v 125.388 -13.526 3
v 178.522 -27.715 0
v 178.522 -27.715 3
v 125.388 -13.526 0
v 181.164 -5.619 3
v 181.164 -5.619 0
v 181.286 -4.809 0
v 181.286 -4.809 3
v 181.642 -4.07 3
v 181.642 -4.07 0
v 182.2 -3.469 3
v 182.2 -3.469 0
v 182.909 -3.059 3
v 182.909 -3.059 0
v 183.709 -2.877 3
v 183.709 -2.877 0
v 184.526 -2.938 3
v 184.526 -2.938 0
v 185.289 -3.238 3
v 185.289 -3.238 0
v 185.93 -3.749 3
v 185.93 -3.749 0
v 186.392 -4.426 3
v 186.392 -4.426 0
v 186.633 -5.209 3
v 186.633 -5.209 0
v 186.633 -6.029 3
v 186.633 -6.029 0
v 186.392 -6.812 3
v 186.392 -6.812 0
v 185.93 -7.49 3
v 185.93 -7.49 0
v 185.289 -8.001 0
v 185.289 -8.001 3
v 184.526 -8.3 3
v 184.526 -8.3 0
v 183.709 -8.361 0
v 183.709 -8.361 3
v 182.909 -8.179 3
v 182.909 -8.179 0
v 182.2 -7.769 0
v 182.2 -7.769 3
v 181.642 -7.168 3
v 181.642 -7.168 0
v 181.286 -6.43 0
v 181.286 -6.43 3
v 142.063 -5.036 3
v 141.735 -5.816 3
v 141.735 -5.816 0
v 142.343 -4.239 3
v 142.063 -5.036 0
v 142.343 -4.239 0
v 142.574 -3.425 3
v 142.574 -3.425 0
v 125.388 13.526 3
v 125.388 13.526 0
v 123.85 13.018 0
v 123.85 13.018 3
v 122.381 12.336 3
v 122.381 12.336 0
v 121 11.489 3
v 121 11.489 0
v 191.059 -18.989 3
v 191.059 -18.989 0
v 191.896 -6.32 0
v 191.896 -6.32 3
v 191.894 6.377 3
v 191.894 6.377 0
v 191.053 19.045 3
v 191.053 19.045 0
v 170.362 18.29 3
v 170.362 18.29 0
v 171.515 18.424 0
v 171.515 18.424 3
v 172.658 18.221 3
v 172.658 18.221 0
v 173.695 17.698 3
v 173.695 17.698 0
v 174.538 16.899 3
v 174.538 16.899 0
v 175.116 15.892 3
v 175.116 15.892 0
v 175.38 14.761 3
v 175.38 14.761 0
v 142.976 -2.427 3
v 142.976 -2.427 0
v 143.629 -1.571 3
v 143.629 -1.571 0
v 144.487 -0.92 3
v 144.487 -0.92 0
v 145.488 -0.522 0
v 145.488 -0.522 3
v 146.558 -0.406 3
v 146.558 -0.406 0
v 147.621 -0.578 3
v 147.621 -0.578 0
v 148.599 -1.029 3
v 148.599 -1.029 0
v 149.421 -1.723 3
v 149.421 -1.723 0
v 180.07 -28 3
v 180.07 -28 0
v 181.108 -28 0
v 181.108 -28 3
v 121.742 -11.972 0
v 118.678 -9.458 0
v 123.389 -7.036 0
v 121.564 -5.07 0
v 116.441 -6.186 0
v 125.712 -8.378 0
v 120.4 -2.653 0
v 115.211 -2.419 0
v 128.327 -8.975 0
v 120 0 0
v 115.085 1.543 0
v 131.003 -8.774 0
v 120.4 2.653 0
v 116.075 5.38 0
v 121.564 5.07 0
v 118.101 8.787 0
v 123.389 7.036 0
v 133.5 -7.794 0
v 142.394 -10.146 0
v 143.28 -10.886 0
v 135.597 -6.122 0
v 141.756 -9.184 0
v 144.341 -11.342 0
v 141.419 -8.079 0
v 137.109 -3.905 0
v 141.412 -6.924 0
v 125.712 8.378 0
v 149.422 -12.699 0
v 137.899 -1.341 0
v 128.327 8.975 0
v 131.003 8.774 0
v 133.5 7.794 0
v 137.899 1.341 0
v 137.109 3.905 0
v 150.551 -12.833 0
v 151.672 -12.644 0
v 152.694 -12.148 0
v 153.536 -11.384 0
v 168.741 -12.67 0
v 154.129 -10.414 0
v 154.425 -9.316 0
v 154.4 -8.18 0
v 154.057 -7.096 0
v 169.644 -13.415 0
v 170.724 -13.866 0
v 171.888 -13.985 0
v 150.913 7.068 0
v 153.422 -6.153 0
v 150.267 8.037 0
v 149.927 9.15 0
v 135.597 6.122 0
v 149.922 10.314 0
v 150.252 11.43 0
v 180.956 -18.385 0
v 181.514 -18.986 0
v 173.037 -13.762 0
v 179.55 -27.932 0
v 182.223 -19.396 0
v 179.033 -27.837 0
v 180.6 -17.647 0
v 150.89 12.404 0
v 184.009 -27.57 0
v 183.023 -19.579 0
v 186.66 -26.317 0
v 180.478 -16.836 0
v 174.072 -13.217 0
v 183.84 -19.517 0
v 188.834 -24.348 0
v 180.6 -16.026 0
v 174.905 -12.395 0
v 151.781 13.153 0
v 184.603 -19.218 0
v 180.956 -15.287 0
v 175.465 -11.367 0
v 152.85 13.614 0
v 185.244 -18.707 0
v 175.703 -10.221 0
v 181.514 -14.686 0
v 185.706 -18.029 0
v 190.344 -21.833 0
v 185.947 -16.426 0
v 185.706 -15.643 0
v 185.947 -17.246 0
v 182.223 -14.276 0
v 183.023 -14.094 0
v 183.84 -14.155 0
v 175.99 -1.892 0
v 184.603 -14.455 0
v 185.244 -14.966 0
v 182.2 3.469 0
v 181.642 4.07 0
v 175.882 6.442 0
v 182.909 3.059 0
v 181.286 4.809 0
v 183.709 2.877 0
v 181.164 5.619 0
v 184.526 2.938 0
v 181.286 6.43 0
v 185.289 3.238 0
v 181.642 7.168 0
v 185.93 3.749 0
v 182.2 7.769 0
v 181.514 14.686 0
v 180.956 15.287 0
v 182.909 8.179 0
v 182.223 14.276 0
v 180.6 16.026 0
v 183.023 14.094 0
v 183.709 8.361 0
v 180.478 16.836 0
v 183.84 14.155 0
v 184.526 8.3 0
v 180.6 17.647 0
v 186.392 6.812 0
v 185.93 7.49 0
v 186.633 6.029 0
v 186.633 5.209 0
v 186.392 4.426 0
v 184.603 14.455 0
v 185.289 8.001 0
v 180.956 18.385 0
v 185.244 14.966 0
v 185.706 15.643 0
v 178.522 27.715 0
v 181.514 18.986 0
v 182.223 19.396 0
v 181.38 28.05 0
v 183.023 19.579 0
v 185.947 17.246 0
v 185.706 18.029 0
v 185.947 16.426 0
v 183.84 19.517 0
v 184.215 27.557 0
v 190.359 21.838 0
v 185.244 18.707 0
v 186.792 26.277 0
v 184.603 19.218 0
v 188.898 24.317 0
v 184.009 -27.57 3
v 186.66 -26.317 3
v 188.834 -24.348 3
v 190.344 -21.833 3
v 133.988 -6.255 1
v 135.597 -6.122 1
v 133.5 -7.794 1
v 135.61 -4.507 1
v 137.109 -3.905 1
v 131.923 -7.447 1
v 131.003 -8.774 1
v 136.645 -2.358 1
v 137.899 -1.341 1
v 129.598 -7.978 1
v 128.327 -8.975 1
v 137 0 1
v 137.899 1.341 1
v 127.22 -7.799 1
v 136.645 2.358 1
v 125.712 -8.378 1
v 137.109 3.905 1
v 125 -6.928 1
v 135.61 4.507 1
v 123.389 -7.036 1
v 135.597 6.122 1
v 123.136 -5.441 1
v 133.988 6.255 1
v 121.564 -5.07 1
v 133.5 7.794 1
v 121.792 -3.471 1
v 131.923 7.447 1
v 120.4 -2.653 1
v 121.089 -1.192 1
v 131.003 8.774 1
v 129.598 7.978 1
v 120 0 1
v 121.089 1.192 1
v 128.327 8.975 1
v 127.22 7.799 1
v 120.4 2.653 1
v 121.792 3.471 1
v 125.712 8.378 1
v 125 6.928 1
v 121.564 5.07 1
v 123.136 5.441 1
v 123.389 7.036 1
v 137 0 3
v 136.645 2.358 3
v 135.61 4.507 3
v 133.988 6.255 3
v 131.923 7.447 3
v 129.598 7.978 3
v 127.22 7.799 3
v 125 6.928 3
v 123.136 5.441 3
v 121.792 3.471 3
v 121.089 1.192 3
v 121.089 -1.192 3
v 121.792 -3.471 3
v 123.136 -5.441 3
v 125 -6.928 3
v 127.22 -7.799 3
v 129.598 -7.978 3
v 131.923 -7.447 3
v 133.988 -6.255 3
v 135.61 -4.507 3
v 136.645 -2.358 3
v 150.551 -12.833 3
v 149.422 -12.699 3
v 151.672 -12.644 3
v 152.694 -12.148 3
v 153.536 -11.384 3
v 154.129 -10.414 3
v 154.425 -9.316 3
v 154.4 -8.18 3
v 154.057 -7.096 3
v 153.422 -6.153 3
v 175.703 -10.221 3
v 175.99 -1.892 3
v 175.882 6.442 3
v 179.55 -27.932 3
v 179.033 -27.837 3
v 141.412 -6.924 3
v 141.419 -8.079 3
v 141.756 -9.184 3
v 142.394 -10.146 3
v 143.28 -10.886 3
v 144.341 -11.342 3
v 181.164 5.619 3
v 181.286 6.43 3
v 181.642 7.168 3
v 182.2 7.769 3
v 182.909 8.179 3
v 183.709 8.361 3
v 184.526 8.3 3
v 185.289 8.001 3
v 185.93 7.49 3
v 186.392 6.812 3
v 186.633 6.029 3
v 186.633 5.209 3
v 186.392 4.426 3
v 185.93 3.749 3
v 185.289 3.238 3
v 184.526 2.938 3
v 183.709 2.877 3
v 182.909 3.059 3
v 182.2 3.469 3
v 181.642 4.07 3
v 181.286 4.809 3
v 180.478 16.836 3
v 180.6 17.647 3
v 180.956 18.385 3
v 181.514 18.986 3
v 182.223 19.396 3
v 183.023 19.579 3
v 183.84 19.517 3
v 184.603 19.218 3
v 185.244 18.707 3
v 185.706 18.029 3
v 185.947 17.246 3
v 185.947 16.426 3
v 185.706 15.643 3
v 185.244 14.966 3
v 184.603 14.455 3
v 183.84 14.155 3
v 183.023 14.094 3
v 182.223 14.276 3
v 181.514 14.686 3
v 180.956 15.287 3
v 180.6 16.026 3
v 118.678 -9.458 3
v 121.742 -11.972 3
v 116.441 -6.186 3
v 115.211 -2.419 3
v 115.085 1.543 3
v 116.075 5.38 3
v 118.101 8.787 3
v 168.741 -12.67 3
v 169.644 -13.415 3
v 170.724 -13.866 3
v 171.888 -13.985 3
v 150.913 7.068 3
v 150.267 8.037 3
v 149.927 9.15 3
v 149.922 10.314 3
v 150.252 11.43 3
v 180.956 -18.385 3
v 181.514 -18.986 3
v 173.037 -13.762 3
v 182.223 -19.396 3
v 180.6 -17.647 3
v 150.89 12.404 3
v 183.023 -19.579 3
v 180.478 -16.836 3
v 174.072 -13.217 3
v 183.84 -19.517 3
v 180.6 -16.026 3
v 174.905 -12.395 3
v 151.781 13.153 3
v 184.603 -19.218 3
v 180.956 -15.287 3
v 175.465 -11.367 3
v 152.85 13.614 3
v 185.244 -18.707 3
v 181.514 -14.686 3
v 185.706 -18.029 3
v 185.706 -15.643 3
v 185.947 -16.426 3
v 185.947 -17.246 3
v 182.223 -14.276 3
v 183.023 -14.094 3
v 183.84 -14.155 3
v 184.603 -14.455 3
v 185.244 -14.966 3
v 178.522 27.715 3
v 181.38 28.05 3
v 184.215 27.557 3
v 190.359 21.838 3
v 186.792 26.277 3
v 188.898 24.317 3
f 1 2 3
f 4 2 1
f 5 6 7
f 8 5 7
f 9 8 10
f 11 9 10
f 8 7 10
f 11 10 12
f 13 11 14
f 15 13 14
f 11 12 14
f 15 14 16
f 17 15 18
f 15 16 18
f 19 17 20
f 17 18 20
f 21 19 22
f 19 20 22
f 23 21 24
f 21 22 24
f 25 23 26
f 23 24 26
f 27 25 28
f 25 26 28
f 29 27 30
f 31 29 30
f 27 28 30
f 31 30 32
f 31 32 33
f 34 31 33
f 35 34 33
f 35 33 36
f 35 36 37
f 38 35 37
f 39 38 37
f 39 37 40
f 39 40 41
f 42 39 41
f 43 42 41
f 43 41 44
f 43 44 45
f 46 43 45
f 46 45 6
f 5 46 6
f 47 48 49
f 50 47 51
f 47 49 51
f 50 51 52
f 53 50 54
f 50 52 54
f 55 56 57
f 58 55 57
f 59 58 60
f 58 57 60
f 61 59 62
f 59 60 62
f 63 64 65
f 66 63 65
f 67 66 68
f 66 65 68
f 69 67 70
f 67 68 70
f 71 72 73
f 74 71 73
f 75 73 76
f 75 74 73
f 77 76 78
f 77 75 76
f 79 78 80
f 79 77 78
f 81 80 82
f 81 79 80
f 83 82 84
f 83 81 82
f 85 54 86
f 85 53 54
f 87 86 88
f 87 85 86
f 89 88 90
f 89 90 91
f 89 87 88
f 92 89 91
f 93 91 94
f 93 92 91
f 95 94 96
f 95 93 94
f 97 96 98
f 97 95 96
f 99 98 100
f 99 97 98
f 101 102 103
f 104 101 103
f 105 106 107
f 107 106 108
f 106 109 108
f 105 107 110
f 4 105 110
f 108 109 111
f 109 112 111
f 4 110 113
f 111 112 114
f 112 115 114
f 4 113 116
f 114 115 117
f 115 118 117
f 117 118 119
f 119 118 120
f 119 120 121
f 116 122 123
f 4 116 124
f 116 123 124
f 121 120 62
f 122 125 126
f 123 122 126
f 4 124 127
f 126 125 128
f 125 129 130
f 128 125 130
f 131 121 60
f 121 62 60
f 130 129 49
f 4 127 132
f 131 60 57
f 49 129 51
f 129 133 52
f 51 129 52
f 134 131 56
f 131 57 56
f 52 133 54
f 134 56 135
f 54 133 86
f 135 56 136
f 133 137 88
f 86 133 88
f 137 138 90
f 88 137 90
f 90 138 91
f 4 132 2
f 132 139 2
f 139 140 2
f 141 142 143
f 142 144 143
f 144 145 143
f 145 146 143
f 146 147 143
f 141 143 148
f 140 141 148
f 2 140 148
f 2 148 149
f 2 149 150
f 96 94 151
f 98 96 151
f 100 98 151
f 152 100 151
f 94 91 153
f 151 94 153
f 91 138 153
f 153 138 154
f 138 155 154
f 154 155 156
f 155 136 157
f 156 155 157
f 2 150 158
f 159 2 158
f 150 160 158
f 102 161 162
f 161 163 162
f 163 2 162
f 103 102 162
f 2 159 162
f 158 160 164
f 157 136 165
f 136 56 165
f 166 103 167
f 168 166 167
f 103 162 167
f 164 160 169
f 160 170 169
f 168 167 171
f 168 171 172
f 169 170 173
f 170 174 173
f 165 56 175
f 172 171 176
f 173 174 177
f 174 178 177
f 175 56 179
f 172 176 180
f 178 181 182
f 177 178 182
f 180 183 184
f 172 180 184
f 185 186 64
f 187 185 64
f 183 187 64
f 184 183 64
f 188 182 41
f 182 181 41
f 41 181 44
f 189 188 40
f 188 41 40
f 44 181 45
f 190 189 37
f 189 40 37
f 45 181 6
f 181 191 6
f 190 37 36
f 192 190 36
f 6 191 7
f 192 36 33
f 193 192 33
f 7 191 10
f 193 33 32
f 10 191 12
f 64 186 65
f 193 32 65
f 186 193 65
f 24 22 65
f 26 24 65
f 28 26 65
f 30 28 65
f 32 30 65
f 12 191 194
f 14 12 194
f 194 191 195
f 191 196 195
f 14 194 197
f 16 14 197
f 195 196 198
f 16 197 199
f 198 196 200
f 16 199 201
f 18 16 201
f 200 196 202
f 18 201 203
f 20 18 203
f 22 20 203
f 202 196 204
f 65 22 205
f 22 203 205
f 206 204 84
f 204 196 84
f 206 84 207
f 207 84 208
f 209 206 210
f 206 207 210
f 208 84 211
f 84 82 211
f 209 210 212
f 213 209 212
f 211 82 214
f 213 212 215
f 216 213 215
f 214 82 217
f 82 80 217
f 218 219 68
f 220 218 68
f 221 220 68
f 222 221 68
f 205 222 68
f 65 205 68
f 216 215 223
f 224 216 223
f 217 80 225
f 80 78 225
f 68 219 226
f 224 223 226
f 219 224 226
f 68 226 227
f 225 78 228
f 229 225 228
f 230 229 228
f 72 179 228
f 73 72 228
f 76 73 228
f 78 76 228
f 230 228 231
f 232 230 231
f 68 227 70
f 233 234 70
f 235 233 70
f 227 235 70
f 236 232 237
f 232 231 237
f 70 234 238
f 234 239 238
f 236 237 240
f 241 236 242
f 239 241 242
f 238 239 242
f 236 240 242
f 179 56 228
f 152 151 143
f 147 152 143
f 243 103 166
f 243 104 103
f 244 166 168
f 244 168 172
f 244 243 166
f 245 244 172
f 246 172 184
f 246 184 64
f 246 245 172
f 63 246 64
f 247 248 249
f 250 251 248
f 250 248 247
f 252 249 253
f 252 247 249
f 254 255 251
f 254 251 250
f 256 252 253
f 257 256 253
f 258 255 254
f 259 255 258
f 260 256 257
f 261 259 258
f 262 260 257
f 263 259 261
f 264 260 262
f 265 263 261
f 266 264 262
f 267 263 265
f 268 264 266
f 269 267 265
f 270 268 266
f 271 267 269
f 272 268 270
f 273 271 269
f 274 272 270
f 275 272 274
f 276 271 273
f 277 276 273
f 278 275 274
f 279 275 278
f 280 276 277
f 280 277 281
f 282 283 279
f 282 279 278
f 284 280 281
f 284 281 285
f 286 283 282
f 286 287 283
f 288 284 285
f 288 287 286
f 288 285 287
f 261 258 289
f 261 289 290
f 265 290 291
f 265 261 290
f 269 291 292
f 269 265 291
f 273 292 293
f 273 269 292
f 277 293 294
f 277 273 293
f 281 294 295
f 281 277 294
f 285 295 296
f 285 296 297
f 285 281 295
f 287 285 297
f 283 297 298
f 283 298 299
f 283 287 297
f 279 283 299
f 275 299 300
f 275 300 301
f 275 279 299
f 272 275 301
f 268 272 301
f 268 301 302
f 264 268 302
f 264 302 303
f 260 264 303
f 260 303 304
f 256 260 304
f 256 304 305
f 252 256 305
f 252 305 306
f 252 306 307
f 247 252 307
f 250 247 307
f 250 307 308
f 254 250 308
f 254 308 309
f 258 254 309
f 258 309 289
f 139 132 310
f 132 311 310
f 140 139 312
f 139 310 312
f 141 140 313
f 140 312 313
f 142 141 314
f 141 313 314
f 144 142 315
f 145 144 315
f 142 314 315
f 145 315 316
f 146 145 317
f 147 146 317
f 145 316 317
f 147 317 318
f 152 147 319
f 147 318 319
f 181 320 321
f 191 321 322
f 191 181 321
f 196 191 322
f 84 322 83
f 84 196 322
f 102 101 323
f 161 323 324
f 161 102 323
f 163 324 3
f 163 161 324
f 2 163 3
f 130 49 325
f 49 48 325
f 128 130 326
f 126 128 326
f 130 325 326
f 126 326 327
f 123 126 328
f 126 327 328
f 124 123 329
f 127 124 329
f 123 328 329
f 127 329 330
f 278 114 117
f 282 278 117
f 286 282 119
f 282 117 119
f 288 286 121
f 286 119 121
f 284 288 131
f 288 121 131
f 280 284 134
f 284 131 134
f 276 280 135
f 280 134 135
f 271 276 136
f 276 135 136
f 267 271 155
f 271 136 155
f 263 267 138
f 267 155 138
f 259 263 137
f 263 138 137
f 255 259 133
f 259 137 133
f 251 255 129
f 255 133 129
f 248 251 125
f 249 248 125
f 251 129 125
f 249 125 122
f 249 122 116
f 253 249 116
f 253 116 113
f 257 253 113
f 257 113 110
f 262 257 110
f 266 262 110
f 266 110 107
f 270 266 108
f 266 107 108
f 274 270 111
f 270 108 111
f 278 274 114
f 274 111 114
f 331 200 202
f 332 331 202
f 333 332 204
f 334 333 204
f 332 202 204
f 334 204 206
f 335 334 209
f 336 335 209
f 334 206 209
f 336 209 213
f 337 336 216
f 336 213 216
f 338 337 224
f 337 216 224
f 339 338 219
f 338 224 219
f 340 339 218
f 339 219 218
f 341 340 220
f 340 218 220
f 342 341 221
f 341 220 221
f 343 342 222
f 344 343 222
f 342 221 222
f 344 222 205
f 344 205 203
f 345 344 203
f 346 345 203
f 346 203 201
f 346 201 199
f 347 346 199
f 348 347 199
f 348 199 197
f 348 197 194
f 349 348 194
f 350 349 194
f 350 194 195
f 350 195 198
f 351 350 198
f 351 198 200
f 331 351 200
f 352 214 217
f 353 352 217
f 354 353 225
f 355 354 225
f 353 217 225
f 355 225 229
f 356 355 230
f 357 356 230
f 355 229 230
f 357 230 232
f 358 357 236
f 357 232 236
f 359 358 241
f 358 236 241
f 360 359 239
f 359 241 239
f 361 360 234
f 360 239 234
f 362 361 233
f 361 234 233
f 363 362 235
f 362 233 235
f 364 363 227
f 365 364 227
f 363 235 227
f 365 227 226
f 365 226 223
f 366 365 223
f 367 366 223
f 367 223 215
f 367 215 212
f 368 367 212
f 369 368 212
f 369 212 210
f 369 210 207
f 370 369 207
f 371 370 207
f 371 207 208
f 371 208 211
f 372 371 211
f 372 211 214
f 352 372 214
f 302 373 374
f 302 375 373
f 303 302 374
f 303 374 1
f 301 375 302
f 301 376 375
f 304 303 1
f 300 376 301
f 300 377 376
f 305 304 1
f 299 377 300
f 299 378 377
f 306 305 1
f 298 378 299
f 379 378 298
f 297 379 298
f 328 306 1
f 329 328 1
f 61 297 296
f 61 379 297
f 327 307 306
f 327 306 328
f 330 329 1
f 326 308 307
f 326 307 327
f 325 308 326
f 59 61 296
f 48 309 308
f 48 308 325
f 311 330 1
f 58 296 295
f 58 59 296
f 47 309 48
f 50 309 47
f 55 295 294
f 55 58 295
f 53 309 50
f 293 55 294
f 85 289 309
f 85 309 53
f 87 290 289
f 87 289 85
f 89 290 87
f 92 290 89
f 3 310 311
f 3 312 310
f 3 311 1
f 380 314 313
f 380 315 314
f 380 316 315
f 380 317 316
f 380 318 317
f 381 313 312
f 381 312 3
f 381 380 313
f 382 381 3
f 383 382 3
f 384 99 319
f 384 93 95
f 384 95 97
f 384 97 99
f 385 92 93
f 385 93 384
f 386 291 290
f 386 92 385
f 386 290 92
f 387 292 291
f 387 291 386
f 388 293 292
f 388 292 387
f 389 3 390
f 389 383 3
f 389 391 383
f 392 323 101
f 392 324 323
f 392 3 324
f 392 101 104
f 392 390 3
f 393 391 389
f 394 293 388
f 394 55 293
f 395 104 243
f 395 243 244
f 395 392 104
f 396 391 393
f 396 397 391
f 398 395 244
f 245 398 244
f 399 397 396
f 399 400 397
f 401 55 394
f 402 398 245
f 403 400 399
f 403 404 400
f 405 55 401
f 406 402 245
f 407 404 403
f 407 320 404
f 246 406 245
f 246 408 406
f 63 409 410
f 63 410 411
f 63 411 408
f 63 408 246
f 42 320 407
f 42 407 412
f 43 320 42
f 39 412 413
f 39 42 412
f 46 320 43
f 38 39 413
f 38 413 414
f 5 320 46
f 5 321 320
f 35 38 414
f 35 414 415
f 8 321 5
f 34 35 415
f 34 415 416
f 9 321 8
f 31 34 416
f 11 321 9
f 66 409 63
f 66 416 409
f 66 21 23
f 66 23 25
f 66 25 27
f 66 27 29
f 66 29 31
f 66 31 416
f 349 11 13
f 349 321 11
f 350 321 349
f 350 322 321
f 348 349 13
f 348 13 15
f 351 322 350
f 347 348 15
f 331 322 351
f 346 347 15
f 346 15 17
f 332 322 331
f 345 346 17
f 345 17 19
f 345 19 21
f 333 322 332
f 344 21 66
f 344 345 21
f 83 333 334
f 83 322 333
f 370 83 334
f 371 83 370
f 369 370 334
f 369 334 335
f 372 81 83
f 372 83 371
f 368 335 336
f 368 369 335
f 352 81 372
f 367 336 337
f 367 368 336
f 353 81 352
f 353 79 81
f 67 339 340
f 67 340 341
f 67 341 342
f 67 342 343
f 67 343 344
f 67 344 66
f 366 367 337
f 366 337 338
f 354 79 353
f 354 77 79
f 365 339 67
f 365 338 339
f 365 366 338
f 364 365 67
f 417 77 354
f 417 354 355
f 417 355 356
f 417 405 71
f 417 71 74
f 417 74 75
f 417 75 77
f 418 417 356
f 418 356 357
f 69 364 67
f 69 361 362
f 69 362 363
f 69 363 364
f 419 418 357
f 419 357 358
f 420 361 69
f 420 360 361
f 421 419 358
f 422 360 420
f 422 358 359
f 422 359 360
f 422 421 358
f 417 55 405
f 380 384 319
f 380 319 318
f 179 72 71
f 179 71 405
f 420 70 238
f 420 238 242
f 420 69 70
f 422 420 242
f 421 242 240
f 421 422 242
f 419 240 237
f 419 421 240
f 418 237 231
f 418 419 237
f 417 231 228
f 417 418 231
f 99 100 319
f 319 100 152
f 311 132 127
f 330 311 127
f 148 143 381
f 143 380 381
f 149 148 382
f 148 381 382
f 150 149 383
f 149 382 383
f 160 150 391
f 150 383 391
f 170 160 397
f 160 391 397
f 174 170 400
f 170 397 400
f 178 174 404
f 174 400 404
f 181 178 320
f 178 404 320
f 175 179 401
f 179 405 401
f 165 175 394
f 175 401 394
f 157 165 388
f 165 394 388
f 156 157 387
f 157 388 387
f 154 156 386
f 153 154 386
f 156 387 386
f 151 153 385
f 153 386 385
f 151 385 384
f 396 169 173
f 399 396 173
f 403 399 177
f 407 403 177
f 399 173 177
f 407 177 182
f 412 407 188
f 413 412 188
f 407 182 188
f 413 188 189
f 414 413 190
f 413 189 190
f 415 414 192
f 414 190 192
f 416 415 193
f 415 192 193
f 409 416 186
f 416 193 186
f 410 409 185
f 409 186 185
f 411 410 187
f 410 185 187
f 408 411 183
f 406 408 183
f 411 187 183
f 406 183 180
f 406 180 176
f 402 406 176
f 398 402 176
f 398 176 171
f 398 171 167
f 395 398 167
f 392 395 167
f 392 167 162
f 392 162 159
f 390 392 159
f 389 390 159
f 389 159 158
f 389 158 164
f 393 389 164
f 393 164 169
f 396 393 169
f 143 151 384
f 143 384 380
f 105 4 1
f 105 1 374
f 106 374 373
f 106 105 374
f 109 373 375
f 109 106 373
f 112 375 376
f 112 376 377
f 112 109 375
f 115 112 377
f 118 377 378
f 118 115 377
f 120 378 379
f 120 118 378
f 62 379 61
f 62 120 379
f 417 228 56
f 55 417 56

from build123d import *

# Parameters (mm, degrees)
SKETCH_1_R          = 8
EXTRUDE_1_DEPTH     = 3
HOLE_WIZARD_M31_D   = 3.4
HOLE_WIZARD_M51_D   = 5.5
HOLE_WIZARD_M52_D   = 5.5
FILLET_1_R          = 10
FILLET_2_R          = 5
SKETCH_9_R          = 9
CUT_EXTRUDE_2_DEPTH = 1
CUT_EXTRUDE_3_DEPTH = 195.061830596
CUT_EXTRUDE_4_DEPTH = 195.061830596
CUT_EXTRUDE_6_DEPTH = 195.061830596
FILLET_6_R          = 4


with BuildPart() as part:
    # Эскиз1 → Бобышка-Вытянуть1 (new body)
    with BuildSketch(Plane.XY):
        with BuildLine():
            Line((-9.508526364, -3.096437692), (-1.398717752, -28))
            Line((-1.398717752, -28), (189.947361129, -28))
            ThreePointArc((189.947361129, -28), (191.995297124, 1.34383112), (189.536809823, 30.656120467))
            Line((189.536809823, 30.656120467), (125.388049295, 13.526041997))
            ThreePointArc((125.388049295, 13.526041997), (123.105499175, 12.698616461), (121.000225207, 11.489282104))
            Line((121.000225207, 11.489282104), (83.76563687, -14.436473614))
            Line((83.76563687, -14.436473614), (63.718090084, -22))
            Line((63.718090084, -22), (35.731449132, -22))
            Line((35.731449132, -22), (20.675178874, -13.02912429))
            Line((20.675178874, -13.02912429), (8.326583423, 5.537870395))
            ThreePointArc((8.326583423, 5.537870395), (-4.357415095, 9.00071851), (-9.508526364, -3.096437692))
        make_face()
        with Locations((129, 0)):
            Circle(SKETCH_1_R, mode=Mode.SUBTRACT)
    extrude(amount=EXTRUDE_1_DEPTH)

    # Отверстие с зазором M31 (through all)
    with Locations(Plane.XY.offset(3)):
        with Locations((9, -25), (40.5, -25), (72, -25)):
            Hole(HOLE_WIZARD_M31_D / 2)

    # Отверстие с зазором M51 (through all)
    with Locations(Plane.XY.offset(3)):
        with Locations((0, 0)):
            Hole(HOLE_WIZARD_M51_D / 2)

    # Отверстие с зазором M52 (through all)
    with Locations(Plane.XY.offset(3)):
        with Locations((183.228106674, 16.836297834), (183.914180714, 5.619086431), (183.914180714, -5.619086431), (183.228106674, -16.836297834)):
            Hole(HOLE_WIZARD_M52_D / 2)

    # Скругление1
    fillet_1_edges = [part.edges().sort_by_distance(p)[0] for p in [
        (35.731449132, -22, 1.5),
        (63.718090084, -22, 1.5),
        (83.76563687, -14.436473614, 1.5),
        (189.536809823, 30.656120467, 1.5),
        (189.947361129, -28, 1.5),
        (20.675178874, -13.02912429, 1.5),
    ]]
    fillet(fillet_1_edges, radius=FILLET_1_R)

    # Скругление2
    fillet_2_edges = [part.edges().sort_by_distance(p)[0] for p in [
        (-1.398717752, -28, 1.5),
    ]]
    fillet(fillet_2_edges, radius=FILLET_2_R)

    # Эскиз9 → Вырез-Вытянуть2 (cut)
    with BuildSketch(Plane(origin=(0, 0, 0), x_dir=(-1, 0, 0), z_dir=(0, 0, -1))):
        with Locations((-129, 0)):
            Circle(SKETCH_9_R)
    extrude(amount=-CUT_EXTRUDE_2_DEPTH, mode=Mode.SUBTRACT)

    # Эскиз10 → Вырез-Вытянуть3 (cut, through all)
    with BuildSketch(Plane.XY.offset(3)):
        with BuildLine():
            Line((6.5, -23.3), (11.5, -23.3))
            ThreePointArc((11.5, -23.3), (13.2, -25), (11.5, -26.7))
            Line((11.5, -26.7), (6.5, -26.7))
            ThreePointArc((6.5, -26.7), (4.8, -25), (6.5, -23.3))
        make_face()
        with BuildLine():
            Line((38, -23.3), (43, -23.3))
            ThreePointArc((43, -23.3), (44.7, -25), (43, -26.7))
            Line((43, -26.7), (38, -26.7))
            ThreePointArc((38, -26.7), (36.3, -25), (38, -23.3))
        make_face()
        with BuildLine():
            Line((69.5, -23.3), (74.5, -23.3))
            ThreePointArc((74.5, -23.3), (76.2, -25), (74.5, -26.7))
            Line((74.5, -26.7), (69.5, -26.7))
            ThreePointArc((69.5, -26.7), (67.8, -25), (69.5, -23.3))
        make_face()
    extrude(amount=-CUT_EXTRUDE_3_DEPTH, mode=Mode.SUBTRACT)

    # Эскиз12 → Вырез-Вытянуть4 (cut, through all)
    with BuildSketch(Plane(origin=(0, 0, 0), x_dir=(-1, 0, 0), z_dir=(0, 0, -1))):
        with BuildLine():
            Line((-178.522421187, -27.714873589), (-125.388049295, -13.526041997))
            ThreePointArc((-125.388049295, -13.526041997), (-115, 0), (-125.388049295, 13.526041997))
            Line((-125.388049295, 13.526041997), (17.708535377, 18.690586902))
            Line((17.708535377, 18.690586902), (9.18577518, -30.07854089))
            Line((9.18577518, -30.07854089), (-194.865610091, -30.07854089))
            Line((-194.865610091, -30.07854089), (-191.053066524, -19.0453609))
            ThreePointArc((-191.053066524, -19.0453609), (-186.79202351, -26.277041029), (-178.522421187, -27.714873589))
        make_face()
    extrude(amount=-CUT_EXTRUDE_4_DEPTH, mode=Mode.SUBTRACT)

    # Эскиз14 → Вырез-Вытянуть6 (cut, through all)
    with BuildSketch(Plane(origin=(0, 0, 0), x_dir=(-1, 0, 0), z_dir=(0, 0, -1))):
        with BuildLine():
            Line((-174.915688269, 19.506460401), (-146.526487717, 11.925499691))
            Line((-146.526487717, 11.925499691), (-174.915688269, -19.506460401))
            ThreePointArc((-174.915688269, -19.506460401), (-176, 0), (-174.915688269, 19.506460401))
        make_face()
        with BuildLine():
            Line((-139.389594338, 9.383833412), (-162.485080357, -16.187030888))
            Line((-162.485080357, -16.187030888), (-138.90792063, -9.891062066))
            ThreePointArc((-138.90792063, -9.891062066), (-142.995630653, -0.349746504), (-139.389594338, 9.383833412))
        make_face()
    extrude(amount=-CUT_EXTRUDE_6_DEPTH, mode=Mode.SUBTRACT)

    # Скругление6
    fillet_6_edges = [part.edges().sort_by_distance(p)[0] for p in [
        (174.915688269, -19.506460401, 1.5),
        (174.915688269, 19.506460401, 1.5),
        (146.526487717, 11.925499691, 1.5),
        (139.389594338, 9.383833412, 1.5),
        (138.90792063, -9.891062066, 1.5),
        (162.485080357, -16.187030888, 1.5),
    ]]
    fillet(fillet_6_edges, radius=FILLET_6_R)


solid = part.part
